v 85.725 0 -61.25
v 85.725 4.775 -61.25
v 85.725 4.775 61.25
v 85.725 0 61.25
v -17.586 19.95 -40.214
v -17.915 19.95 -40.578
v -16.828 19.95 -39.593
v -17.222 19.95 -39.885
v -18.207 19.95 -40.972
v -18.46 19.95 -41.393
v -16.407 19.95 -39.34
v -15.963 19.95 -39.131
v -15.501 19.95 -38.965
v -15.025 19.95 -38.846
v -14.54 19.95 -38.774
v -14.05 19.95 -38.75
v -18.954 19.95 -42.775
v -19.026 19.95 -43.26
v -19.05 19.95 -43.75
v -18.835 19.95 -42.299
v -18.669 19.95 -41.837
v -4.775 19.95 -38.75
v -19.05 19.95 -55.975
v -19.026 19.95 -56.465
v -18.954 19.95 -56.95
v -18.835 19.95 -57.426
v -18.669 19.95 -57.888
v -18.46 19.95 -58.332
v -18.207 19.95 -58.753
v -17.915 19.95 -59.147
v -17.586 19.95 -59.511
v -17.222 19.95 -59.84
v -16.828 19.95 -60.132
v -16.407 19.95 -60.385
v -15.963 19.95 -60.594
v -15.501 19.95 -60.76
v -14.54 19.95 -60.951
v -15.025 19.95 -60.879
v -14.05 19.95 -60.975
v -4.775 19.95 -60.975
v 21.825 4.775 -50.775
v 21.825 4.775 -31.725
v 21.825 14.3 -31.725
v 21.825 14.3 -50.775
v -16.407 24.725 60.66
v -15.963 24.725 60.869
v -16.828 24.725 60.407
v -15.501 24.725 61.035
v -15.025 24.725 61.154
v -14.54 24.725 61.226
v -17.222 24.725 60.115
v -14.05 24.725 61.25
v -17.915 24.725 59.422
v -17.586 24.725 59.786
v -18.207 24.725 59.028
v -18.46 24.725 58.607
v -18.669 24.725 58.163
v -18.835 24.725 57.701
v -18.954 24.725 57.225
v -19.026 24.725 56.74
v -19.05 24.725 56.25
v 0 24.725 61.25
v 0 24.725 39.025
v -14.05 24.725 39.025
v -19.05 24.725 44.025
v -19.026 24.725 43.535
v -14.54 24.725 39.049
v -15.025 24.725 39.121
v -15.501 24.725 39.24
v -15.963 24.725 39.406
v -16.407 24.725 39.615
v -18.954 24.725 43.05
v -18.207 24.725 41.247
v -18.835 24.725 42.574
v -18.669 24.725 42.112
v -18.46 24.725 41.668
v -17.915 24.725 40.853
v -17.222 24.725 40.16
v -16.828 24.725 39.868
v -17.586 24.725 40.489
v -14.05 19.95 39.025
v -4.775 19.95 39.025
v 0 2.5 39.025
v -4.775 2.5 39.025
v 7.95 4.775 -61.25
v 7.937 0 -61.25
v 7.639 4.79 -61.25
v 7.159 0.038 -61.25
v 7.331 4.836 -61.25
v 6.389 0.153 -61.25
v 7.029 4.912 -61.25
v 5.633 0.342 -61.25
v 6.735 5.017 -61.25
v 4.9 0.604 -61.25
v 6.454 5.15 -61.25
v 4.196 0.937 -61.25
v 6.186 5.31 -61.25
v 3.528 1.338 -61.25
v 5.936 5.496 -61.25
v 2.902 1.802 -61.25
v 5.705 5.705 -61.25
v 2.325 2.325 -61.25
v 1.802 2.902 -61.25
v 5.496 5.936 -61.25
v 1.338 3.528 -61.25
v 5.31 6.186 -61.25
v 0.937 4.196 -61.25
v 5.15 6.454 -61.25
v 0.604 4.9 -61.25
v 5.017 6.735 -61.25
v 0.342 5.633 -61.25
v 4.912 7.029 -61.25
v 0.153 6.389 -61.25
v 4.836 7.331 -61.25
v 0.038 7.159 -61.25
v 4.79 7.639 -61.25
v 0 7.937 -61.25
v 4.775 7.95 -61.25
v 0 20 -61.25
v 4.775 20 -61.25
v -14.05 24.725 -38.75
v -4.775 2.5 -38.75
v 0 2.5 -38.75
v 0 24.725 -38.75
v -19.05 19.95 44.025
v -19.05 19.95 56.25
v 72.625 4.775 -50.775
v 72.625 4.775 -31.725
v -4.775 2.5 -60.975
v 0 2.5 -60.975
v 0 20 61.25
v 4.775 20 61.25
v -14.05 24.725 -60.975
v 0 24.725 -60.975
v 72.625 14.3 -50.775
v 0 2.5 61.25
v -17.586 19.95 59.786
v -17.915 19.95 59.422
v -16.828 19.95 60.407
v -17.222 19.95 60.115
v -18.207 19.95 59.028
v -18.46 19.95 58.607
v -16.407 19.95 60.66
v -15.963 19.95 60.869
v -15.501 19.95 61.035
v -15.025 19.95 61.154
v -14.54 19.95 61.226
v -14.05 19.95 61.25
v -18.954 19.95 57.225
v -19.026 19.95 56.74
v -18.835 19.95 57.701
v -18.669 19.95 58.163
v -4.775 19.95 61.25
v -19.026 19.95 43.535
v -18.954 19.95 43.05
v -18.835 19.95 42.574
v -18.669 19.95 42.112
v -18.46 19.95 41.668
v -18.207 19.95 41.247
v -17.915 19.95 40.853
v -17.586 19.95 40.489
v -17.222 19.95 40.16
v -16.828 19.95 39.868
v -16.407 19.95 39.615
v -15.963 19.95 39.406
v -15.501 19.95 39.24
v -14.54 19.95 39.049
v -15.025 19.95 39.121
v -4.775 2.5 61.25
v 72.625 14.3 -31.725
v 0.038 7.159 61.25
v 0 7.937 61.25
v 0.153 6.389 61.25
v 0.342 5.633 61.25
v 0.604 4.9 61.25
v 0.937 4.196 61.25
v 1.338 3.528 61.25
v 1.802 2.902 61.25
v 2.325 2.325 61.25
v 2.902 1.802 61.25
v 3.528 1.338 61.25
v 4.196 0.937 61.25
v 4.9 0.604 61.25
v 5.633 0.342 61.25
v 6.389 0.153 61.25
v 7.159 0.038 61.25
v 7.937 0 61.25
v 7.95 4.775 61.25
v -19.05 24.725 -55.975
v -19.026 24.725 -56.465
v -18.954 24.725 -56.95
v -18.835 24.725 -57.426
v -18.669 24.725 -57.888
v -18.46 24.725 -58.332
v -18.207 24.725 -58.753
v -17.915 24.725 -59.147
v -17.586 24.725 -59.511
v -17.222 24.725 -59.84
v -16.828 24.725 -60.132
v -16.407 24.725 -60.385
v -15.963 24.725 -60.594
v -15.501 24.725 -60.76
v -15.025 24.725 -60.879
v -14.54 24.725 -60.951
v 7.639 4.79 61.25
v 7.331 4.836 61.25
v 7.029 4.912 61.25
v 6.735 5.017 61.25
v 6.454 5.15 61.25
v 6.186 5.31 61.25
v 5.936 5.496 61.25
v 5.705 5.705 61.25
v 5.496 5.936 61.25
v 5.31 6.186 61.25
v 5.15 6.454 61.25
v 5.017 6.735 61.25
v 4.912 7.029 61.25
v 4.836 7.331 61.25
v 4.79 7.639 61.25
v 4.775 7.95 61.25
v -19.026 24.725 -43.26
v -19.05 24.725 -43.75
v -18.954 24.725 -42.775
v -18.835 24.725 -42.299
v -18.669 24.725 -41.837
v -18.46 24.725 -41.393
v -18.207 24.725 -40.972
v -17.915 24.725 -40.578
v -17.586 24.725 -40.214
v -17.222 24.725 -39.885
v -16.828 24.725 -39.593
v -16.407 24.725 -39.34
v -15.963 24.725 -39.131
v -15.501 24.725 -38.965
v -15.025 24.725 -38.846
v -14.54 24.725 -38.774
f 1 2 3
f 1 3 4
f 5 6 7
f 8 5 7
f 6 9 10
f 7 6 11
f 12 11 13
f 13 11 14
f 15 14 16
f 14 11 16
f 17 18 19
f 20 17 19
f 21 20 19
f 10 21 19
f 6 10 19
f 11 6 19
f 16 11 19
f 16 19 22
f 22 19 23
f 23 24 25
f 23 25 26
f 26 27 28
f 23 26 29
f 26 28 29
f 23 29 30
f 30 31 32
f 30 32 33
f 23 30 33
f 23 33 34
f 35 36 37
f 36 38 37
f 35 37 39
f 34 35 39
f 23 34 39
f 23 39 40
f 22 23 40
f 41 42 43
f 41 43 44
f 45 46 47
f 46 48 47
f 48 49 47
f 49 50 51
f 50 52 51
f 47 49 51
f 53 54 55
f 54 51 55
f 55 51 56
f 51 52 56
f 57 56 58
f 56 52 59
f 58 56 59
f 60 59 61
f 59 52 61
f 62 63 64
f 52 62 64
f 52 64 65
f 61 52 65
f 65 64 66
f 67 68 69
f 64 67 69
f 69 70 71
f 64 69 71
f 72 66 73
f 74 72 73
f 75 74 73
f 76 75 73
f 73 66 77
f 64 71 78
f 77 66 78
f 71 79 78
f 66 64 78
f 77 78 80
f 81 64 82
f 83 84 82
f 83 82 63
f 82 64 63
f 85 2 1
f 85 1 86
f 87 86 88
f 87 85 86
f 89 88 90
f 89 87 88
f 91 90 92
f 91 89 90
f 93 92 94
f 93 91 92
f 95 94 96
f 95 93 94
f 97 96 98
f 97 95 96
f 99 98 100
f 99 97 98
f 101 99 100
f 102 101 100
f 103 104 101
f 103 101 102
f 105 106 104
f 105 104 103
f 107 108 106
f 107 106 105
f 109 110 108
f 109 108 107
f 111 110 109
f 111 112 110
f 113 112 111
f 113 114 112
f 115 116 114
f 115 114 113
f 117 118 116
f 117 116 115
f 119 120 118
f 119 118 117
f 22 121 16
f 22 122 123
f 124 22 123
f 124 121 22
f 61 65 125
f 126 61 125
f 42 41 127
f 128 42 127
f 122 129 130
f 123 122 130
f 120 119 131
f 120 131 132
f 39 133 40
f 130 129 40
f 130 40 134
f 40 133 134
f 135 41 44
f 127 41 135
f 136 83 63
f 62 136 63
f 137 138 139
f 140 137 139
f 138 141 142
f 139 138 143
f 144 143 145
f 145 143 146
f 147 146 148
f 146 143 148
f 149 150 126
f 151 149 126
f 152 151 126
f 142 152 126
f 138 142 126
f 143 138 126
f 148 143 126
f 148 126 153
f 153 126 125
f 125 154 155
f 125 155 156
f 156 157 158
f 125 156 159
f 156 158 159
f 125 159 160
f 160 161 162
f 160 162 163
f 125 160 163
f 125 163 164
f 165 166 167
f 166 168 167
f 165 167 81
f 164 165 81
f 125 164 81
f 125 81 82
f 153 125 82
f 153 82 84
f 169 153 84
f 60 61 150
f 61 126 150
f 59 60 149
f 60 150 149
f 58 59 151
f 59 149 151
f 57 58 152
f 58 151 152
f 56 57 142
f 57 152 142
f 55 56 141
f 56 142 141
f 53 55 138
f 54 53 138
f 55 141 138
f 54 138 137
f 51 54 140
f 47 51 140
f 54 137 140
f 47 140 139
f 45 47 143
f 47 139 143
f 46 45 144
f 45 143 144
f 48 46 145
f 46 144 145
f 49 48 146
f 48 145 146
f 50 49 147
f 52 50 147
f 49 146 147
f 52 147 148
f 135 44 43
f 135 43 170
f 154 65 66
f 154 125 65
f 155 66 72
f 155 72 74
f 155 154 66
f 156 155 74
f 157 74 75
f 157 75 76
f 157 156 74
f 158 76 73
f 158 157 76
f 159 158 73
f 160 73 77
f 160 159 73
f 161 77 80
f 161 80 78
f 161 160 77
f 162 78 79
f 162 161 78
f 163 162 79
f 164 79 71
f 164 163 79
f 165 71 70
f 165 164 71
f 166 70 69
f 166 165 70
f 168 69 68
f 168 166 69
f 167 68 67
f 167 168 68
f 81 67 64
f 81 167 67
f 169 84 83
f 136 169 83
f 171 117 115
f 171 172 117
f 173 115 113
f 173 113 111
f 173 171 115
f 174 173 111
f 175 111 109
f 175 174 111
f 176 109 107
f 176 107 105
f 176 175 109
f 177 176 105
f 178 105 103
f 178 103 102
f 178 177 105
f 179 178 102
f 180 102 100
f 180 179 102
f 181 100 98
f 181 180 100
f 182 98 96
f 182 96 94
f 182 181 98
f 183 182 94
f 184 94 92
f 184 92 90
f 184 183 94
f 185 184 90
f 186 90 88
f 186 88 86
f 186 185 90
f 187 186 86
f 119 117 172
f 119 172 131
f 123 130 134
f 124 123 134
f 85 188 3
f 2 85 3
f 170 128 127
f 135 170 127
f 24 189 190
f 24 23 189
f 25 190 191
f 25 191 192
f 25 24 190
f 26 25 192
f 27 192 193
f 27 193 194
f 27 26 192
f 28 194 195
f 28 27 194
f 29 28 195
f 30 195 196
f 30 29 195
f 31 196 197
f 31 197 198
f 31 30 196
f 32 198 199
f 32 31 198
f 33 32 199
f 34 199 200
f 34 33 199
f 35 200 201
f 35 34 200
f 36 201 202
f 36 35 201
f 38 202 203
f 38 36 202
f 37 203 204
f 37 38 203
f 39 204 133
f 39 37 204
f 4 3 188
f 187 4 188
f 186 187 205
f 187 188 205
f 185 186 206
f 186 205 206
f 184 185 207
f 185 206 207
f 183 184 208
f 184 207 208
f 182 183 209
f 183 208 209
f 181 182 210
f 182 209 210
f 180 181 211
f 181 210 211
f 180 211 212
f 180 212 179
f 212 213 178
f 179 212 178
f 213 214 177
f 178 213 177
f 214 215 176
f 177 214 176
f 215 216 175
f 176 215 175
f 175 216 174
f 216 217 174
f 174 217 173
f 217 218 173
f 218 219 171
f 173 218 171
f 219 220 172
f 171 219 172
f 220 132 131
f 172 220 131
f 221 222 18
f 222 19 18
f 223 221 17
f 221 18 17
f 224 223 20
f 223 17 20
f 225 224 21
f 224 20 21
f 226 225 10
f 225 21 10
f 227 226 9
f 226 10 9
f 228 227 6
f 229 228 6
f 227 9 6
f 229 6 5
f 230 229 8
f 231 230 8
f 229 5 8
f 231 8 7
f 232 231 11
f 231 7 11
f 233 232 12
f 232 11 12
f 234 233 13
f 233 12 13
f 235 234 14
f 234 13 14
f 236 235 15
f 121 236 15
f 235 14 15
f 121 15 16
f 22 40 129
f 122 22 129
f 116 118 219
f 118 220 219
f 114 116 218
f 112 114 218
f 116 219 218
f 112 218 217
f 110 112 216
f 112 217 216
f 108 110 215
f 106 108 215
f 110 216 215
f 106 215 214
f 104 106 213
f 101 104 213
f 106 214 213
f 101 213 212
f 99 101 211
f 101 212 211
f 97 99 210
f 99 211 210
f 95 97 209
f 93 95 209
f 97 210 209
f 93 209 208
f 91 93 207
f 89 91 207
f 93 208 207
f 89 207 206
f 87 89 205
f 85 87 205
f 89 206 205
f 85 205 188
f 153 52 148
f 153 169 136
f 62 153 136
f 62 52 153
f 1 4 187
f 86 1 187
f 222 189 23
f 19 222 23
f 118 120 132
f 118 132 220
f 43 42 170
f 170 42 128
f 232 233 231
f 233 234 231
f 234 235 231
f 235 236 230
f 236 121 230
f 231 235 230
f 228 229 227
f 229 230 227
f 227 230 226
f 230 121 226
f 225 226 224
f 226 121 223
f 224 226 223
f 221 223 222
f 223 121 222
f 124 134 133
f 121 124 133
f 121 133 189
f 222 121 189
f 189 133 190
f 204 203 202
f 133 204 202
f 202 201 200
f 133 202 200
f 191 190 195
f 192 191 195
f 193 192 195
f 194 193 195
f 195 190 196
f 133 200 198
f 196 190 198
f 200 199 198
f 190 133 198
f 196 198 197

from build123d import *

# Parameters (mm, degrees)
EXTRUDE1_DEPTH      = 61.25
EXTRUDE1_DEPTH_BACK = 61.25
FILLET1_R           = 3.175
FILLET2_R           = 7.9375
EXTRUDE2_DEPTH      = 22.225
FILLET3_R           = 5
SKETCH35_W          = 50.8
SKETCH35_H          = 19.05
EXTRUDE3_DEPTH      = 9.525
LPATTERN7_COUNT     = 2
LPATTERN7_PITCH     = 100


with BuildPart() as part:
    # Sketch1 → Extrude1 (new, two sides: drawn at the far end of the back side and taken through both)
    with BuildSketch(Plane.XY.offset(-EXTRUDE1_DEPTH_BACK)):
        Polygon((0, 0), (0, 20), (4.7752, 20), (4.7752, 4.7752), (85.725, 4.7752), (85.725, 0), align=None)
    extrude(amount=EXTRUDE1_DEPTH + EXTRUDE1_DEPTH_BACK)

    # Fillet1
    fillet1_edges = [part.edges().sort_by_distance(p)[0] for p in [
        (4.7752, 4.7752, 0),
    ]]
    fillet(fillet1_edges, radius=FILLET1_R)

    # Fillet2
    fillet2_edges = [part.edges().sort_by_distance(p)[0] for p in [
        (0, 0, 0),
    ]]
    fillet(fillet2_edges, radius=FILLET2_R)


with BuildPart() as body_2:
    # Sketch34 → Extrude2 (new body)
    with BuildSketch(Plane(origin=(0, 0, -60.975), x_dir=(-1, 0, 0), z_dir=(0, 0, -1))):
        Polygon((0, 2.4999), (0, 24.7249), (19.05, 24.7249), (19.05, 19.9497), (4.7752, 19.9497), (4.7752, 2.4999), align=None)
    extrude(amount=-EXTRUDE2_DEPTH)

    # Fillet3
    fillet3_edges = [body_2.edges().sort_by_distance(p)[0] for p in [
        (-19.05, 22.3373, -38.75),
        (-19.05, 22.3373, -60.975),
    ]]
    fillet(fillet3_edges, radius=FILLET3_R)


with BuildPart() as body_3:
    # Sketch35 → Extrude3 (new body)
    with BuildSketch(Plane(origin=(0, 4.7752, 0), x_dir=(1, 0, 0), z_dir=(0, 1, 0))):
        with Locations((47.2248, 41.25)):
            Rectangle(SKETCH35_W, SKETCH35_H)
    extrude(amount=EXTRUDE3_DEPTH)


with BuildPart() as lpattern7_1:
    # LPattern7: pattern copy
    add(body_2.part.moved(Location(Vector(0, 0, 1) * (1 * LPATTERN7_PITCH))))


solid = Compound([part.part, body_2.part, body_3.part, lpattern7_1.part])
